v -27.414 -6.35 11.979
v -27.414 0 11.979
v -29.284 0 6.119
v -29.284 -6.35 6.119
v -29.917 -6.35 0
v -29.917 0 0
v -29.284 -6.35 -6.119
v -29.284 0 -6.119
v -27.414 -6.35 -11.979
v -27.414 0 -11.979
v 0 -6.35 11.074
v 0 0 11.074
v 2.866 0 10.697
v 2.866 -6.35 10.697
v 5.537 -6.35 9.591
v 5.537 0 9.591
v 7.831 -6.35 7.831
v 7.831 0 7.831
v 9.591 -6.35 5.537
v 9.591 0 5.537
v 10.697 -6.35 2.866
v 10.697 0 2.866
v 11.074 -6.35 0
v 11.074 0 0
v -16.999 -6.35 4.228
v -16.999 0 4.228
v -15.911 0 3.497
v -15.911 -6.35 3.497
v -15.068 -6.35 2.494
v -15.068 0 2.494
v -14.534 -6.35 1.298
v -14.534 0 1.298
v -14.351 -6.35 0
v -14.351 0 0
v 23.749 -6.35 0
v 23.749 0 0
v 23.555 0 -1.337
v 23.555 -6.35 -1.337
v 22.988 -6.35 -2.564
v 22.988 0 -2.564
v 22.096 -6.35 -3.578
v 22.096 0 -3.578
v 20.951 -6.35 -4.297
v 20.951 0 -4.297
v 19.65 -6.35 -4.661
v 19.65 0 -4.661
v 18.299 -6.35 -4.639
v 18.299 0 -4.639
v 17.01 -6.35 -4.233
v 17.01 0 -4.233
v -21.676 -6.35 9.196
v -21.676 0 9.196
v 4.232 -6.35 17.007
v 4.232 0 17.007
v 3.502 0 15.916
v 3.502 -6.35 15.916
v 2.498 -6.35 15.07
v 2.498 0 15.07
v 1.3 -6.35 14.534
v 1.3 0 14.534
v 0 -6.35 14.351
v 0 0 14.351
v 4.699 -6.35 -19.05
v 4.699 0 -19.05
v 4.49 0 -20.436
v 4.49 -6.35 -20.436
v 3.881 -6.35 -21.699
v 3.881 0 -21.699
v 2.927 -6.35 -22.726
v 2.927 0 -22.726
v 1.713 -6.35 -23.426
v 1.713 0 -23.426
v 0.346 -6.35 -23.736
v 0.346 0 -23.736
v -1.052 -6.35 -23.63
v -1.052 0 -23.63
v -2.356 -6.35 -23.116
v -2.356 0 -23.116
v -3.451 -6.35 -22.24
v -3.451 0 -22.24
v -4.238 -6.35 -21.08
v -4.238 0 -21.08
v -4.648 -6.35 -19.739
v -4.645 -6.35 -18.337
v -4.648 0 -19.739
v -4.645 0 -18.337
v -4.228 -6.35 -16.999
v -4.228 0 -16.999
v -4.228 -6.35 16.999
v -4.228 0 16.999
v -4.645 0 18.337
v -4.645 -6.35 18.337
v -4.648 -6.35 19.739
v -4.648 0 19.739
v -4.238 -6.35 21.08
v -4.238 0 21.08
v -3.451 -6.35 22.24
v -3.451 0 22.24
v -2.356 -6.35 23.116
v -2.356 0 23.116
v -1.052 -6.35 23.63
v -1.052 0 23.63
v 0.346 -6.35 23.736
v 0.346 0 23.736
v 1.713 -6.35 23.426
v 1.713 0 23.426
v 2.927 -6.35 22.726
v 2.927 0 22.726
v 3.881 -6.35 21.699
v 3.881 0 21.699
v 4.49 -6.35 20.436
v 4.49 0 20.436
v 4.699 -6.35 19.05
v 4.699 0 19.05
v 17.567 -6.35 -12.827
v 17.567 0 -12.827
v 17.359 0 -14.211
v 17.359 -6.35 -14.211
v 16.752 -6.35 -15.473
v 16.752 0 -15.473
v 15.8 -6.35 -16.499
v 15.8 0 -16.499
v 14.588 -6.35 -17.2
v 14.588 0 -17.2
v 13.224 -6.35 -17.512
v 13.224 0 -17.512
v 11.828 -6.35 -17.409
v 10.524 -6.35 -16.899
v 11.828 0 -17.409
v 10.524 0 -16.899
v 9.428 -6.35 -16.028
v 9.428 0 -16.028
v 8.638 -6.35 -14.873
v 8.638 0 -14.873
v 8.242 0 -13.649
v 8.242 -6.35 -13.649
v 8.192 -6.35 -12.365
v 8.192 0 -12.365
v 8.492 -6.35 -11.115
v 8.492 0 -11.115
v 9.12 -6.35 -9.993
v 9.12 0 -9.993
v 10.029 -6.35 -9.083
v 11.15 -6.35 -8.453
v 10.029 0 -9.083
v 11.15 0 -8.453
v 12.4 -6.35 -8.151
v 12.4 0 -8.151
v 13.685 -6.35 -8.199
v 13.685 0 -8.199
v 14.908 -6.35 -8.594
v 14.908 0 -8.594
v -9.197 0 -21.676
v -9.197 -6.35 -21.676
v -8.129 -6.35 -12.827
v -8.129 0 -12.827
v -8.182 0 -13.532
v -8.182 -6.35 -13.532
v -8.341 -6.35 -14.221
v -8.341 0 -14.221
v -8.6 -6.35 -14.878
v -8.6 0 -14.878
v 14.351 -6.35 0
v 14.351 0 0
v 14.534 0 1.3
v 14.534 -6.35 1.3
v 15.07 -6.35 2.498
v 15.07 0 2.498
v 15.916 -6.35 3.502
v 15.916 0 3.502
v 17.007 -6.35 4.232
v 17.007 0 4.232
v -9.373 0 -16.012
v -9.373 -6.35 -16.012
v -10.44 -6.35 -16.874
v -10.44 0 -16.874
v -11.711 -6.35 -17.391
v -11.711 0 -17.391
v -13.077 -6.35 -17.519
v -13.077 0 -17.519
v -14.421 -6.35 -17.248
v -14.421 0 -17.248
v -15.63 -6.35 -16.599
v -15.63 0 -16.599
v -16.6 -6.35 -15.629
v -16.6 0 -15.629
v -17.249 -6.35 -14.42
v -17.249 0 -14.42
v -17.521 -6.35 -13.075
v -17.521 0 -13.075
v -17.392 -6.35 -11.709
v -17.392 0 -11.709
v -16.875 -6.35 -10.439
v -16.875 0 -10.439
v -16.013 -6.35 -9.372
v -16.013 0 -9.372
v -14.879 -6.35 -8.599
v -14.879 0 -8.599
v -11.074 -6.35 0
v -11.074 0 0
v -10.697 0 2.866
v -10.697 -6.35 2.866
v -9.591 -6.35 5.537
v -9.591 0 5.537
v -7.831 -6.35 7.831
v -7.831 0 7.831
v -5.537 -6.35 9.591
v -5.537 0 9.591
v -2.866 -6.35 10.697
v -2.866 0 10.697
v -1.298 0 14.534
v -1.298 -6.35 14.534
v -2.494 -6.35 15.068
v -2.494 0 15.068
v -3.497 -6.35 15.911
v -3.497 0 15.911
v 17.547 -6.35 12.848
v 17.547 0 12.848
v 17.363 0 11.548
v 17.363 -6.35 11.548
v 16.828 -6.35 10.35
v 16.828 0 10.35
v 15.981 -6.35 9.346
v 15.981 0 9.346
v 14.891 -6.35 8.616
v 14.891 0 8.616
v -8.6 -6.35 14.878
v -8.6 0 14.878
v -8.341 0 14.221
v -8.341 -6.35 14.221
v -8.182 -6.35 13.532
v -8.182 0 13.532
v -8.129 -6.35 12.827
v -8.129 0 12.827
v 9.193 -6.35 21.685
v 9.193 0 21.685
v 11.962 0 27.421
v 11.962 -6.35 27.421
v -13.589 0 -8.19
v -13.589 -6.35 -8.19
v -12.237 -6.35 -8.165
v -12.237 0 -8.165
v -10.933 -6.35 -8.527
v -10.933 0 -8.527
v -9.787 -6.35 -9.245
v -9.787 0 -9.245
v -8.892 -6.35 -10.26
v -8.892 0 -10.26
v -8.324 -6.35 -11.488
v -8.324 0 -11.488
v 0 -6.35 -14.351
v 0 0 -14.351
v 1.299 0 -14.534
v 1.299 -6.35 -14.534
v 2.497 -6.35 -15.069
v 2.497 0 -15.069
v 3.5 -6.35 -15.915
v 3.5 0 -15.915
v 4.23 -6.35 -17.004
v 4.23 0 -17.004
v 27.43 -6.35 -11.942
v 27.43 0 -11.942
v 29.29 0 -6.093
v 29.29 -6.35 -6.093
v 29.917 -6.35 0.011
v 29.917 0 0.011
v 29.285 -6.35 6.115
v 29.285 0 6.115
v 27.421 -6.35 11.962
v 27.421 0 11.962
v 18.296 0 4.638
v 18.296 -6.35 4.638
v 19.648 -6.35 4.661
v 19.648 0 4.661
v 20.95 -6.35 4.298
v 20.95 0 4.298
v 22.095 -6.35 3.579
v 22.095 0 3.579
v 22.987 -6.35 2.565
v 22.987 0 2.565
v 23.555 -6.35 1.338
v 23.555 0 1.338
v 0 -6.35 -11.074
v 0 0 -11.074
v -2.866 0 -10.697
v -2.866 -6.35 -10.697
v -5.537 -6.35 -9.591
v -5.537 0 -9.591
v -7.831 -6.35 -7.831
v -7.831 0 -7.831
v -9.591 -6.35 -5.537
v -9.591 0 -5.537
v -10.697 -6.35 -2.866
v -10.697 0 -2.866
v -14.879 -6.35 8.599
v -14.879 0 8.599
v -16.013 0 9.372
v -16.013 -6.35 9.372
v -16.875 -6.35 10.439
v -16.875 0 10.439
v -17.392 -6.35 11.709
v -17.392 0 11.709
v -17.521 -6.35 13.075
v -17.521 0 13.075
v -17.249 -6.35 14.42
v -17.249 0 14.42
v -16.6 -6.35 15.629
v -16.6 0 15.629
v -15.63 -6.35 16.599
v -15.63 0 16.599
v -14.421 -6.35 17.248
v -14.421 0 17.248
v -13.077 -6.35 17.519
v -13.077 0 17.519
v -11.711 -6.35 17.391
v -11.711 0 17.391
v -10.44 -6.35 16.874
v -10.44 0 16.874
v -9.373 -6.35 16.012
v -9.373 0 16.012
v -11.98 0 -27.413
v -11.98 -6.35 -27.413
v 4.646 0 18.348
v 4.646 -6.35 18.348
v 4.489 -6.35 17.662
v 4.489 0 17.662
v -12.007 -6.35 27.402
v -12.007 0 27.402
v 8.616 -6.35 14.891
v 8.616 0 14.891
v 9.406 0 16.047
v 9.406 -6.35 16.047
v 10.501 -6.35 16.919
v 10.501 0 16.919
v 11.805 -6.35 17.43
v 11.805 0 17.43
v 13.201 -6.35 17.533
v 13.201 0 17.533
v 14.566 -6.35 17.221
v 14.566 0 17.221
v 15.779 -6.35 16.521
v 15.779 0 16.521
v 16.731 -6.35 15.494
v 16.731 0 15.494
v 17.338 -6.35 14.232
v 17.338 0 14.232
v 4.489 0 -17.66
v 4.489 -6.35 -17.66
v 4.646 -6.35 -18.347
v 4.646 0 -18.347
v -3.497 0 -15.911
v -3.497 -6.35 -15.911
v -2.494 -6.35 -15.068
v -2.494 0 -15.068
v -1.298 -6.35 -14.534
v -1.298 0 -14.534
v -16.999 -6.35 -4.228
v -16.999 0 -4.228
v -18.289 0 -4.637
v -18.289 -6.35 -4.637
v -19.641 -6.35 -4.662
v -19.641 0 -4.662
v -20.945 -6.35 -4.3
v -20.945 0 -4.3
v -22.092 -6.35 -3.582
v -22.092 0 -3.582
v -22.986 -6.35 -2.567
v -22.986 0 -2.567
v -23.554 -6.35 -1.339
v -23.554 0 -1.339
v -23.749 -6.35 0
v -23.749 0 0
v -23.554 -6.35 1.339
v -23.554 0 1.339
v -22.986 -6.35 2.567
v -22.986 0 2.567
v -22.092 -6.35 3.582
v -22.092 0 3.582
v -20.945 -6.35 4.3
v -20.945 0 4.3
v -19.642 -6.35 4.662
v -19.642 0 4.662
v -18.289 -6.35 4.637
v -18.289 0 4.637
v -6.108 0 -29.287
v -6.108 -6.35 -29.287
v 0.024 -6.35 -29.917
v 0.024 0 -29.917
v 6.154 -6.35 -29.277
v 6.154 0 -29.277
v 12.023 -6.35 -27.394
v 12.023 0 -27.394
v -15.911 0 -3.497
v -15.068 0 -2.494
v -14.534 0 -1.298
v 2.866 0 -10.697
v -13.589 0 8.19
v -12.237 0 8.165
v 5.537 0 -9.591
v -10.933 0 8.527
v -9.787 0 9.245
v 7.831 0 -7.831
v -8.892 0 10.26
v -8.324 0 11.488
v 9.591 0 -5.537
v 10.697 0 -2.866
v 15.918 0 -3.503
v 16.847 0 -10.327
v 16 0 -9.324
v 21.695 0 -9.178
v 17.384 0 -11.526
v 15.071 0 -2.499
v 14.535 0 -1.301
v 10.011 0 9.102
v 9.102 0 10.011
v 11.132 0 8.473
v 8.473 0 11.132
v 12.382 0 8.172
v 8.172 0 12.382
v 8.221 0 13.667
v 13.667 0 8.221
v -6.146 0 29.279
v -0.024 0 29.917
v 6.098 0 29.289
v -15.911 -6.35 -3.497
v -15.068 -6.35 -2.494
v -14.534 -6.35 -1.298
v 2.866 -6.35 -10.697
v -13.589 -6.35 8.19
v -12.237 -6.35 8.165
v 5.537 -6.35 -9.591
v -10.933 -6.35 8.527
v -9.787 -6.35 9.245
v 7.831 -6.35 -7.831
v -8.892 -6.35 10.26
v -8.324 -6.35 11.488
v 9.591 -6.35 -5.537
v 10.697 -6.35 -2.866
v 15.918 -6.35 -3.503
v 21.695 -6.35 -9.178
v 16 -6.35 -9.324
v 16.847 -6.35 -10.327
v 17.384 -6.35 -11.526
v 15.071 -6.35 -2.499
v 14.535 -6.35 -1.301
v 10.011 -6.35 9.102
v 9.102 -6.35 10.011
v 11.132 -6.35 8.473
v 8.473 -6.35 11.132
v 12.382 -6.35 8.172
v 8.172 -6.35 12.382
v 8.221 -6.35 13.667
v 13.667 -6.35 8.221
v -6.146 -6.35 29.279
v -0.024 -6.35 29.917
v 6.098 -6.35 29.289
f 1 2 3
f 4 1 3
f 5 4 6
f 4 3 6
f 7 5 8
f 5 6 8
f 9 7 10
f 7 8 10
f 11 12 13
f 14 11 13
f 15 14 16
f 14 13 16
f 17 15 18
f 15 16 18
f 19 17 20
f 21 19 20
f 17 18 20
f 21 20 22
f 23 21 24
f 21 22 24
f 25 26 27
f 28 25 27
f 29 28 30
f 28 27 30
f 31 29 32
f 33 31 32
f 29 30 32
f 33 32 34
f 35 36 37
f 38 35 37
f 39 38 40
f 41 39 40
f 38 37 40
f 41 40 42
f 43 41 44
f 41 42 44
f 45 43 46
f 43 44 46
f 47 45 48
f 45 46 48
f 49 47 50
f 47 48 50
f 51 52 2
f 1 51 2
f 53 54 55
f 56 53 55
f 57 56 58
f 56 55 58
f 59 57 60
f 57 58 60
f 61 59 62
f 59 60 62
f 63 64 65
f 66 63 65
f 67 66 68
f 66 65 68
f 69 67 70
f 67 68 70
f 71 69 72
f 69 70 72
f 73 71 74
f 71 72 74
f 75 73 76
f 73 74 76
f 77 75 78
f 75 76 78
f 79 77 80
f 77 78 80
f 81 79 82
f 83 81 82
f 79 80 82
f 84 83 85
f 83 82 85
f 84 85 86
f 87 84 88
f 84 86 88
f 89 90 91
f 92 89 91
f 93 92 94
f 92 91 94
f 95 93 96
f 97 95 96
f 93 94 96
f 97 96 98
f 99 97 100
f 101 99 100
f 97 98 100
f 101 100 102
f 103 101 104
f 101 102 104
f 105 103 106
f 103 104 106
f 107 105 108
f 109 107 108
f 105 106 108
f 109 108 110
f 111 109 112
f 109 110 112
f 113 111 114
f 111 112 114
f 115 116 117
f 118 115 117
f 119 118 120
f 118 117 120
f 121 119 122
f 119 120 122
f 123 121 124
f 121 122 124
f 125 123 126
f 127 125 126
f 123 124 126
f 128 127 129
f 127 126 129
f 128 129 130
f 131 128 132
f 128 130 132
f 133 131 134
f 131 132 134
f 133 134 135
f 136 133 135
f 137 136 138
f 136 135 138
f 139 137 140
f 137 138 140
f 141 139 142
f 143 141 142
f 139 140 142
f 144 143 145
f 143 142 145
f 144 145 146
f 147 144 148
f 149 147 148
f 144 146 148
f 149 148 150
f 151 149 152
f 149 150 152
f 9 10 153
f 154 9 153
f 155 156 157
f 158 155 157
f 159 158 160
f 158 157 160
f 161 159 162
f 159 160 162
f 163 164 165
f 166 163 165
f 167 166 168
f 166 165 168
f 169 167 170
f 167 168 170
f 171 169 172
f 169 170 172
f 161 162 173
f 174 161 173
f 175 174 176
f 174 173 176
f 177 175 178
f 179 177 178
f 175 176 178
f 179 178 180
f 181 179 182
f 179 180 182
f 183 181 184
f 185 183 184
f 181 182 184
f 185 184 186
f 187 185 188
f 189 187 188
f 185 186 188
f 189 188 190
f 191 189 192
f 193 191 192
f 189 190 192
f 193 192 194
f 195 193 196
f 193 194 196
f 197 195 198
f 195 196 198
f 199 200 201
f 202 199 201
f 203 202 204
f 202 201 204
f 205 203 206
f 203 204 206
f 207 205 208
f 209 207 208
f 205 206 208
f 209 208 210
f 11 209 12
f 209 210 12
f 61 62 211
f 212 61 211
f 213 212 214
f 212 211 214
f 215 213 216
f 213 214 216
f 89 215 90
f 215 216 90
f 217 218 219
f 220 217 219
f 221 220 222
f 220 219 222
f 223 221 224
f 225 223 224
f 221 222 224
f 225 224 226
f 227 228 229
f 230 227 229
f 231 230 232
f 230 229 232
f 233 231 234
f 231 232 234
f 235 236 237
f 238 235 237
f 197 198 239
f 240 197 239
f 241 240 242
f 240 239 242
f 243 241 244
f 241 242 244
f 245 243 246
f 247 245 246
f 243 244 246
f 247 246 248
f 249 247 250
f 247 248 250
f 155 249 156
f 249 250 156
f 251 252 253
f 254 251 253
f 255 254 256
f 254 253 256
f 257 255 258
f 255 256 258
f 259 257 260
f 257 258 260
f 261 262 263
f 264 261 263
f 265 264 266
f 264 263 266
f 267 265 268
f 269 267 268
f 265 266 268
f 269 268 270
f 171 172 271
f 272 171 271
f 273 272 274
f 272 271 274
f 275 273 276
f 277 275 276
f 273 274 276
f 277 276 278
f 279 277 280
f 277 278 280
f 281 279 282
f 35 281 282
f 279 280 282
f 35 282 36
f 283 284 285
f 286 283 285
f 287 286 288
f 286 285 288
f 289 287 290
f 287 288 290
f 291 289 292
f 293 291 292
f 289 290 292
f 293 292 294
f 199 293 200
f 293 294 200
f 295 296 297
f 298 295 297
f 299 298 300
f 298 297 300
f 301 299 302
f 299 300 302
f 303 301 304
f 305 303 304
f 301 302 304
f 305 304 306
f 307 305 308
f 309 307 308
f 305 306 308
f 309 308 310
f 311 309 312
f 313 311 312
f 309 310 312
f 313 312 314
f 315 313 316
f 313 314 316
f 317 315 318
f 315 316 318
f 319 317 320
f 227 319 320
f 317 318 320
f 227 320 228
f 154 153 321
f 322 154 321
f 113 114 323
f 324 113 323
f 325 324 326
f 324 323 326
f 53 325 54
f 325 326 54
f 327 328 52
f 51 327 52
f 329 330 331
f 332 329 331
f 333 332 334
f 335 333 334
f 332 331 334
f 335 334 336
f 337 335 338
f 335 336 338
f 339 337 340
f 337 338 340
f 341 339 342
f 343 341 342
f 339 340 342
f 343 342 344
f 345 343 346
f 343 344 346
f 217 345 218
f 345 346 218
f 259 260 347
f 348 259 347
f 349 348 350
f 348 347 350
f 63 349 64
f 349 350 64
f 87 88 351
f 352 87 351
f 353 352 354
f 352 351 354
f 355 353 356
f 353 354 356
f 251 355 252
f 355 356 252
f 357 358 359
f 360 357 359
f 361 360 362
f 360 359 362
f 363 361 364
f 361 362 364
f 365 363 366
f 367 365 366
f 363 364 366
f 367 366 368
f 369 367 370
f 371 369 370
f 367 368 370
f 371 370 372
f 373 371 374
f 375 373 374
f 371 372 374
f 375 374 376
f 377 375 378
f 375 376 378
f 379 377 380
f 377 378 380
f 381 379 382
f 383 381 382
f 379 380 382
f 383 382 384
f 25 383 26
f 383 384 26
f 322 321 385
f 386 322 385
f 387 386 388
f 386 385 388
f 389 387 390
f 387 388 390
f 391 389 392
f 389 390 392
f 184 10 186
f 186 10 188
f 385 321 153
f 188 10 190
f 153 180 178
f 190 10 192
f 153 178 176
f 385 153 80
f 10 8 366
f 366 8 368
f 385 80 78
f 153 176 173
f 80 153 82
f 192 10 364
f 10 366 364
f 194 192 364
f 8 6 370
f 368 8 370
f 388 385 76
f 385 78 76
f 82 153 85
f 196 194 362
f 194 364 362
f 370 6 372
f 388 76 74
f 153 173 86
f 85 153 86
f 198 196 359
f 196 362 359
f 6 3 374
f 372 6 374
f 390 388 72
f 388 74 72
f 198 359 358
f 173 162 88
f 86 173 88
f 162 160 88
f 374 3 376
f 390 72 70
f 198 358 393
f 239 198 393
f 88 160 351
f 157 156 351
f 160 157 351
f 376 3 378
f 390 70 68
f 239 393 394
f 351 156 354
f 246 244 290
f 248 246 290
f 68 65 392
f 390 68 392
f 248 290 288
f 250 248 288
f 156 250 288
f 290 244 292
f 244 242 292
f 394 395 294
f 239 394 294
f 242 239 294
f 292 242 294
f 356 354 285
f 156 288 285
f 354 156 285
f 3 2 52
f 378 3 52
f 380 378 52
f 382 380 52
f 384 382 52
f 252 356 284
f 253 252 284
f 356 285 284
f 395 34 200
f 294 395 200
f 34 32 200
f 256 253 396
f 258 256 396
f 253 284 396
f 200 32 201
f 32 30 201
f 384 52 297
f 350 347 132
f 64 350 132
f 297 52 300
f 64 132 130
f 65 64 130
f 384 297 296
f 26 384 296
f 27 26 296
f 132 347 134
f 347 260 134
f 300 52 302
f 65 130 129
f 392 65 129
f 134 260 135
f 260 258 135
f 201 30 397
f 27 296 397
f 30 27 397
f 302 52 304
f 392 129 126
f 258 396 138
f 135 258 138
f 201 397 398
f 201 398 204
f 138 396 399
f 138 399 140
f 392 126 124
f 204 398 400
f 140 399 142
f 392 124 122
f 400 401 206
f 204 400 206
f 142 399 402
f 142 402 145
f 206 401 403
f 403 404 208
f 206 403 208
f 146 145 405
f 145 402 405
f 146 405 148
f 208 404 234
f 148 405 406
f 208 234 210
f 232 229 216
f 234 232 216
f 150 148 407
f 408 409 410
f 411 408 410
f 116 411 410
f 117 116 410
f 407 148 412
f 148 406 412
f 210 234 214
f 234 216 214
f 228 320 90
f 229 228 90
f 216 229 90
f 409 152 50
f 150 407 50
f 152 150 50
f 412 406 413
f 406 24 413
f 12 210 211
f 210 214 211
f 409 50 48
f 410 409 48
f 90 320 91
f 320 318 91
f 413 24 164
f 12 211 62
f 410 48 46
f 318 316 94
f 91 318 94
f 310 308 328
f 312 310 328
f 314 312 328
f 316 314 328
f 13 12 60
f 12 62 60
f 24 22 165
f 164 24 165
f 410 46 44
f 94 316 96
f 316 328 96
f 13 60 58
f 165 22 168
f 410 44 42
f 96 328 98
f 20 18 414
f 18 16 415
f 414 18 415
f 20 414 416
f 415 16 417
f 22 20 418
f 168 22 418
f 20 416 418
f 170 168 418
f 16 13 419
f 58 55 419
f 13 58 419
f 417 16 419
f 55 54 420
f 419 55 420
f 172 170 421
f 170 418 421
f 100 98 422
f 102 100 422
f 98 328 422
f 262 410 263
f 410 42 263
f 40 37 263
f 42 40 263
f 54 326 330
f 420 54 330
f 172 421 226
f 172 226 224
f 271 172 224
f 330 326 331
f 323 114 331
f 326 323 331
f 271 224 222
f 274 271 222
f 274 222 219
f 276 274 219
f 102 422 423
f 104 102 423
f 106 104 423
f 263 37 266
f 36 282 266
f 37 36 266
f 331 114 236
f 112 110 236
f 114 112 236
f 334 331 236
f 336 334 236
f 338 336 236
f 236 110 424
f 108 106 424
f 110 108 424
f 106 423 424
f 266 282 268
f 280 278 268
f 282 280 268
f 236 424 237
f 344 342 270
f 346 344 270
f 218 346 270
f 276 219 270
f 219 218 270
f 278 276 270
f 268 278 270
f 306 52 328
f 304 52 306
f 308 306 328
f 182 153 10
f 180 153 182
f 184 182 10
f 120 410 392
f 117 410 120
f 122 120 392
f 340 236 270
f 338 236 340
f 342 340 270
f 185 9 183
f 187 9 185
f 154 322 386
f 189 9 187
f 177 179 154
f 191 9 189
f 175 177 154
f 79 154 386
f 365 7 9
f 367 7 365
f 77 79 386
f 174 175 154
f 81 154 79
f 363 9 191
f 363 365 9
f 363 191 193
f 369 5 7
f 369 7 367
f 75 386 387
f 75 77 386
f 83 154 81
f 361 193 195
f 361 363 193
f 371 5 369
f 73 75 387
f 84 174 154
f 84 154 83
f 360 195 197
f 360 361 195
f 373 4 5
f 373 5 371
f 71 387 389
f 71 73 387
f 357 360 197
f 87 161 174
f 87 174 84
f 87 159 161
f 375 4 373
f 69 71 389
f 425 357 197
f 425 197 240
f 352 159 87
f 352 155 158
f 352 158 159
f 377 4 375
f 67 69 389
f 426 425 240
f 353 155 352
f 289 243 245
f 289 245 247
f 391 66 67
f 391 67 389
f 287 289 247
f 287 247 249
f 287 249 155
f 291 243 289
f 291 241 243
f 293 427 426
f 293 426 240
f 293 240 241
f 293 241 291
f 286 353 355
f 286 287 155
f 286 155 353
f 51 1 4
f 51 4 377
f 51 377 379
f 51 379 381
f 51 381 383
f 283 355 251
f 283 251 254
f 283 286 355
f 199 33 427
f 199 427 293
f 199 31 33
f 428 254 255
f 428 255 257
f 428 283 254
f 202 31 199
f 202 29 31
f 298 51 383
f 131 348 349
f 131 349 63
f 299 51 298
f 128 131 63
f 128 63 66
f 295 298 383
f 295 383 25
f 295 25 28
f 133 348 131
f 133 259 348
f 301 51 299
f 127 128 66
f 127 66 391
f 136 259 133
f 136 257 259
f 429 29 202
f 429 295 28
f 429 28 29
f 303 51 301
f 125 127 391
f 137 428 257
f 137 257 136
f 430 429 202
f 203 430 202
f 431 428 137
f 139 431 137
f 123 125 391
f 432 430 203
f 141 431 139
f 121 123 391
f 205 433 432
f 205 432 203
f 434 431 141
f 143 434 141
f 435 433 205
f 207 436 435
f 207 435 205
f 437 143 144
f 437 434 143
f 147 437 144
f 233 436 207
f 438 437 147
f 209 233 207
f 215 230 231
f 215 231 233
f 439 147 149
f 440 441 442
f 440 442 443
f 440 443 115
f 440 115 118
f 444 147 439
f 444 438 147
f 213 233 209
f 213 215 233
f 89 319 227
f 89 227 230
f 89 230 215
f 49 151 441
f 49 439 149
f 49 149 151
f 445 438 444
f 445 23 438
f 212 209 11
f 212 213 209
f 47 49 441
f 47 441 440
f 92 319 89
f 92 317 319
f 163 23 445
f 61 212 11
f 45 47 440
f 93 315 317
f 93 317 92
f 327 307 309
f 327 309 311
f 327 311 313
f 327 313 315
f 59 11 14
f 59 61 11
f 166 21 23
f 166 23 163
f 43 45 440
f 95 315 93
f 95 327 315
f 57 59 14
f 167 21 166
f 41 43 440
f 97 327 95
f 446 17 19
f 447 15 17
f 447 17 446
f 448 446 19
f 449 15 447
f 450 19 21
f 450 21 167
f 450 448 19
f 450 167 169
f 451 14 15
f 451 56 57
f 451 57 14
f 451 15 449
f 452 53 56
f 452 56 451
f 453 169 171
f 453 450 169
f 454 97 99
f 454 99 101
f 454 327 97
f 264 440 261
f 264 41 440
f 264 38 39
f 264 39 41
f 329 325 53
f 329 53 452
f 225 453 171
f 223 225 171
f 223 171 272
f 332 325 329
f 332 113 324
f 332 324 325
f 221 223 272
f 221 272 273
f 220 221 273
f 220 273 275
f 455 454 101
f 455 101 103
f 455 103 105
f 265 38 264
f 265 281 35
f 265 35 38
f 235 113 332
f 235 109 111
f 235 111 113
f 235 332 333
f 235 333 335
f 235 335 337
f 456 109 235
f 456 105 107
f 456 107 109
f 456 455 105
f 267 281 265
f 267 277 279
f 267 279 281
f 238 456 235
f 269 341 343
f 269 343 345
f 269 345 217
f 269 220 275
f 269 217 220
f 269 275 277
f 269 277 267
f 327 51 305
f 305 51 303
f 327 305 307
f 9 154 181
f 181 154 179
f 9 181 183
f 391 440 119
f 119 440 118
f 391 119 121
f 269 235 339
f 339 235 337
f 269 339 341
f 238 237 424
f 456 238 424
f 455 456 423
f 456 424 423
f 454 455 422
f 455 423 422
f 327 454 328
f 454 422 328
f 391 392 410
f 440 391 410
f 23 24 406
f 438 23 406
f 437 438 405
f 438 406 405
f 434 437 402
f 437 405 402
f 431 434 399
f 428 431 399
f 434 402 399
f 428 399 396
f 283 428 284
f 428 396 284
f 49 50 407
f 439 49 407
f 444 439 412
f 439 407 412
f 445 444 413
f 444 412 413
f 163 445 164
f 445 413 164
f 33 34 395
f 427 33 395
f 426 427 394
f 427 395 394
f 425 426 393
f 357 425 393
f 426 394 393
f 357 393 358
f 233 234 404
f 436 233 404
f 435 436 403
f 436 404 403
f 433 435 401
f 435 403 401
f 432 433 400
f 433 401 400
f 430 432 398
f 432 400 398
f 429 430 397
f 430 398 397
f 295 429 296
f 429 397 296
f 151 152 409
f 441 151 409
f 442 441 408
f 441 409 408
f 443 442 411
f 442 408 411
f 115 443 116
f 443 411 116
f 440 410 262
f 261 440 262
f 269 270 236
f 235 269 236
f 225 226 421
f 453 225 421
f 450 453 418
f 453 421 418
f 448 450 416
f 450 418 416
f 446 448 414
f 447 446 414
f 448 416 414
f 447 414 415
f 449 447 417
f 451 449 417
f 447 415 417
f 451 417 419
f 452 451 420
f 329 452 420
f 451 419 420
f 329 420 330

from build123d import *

# Parameters (mm, degrees)
F1_DEPTH = 6.35


with BuildPart() as f1:
    # F0 (on Front) → F1 (new body)
    with BuildSketch(Plane.XZ):
        with BuildLine():
            Line((-6.4141074981, 15.9385126175), (-4.2278079722, 16.9990878248))
            ThreePointArc((-4.2278079722, 16.9990878248), (-1.0521718821, 23.6296872525), (4.699, 19.05))
            ThreePointArc((4.699, 19.05), (4.5806844818, 18.0021781266), (4.2316960296, 17.0071221983))
            Line((4.2316960296, 17.0071221983), (6.4238473824, 15.9488473824))
            Line((6.4238473824, 15.9488473824), (9.1930085155, 21.6849947733))
            Line((9.1930085155, 21.6849947733), (11.9621696486, 27.4211421643))
            ThreePointArc((11.9621696486, 27.4211421643), (-0.0243040276, 29.9167503183), (-12.0067070775, 27.4016701215))
            Line((-12.0067070775, 27.4016701215), (-6.4141074981, 15.9385126175))
        make_face()
        with BuildLine():
            Line((-8.6004070241, 14.8779374102), (-6.4141074981, 15.9385126175))
            Line((-6.4141074981, 15.9385126175), (-12.0067070775, 27.4016701215))
            Line((-12.0067070775, 27.4016701215), (-21.6763890996, 9.1963973453))
            Line((-21.6763890996, 9.1963973453), (-15.9391074981, 6.4135126175))
            Line((-15.9391074981, 6.4135126175), (-14.8789637146, 8.5991379737))
            ThreePointArc((-14.8789637146, 8.5991379737), (-16.1509739914, 16.1496557682), (-8.6004070241, 14.8779374102))
        make_face()
        with BuildLine():
            ThreePointArc((-16.9992346746, -4.227879206), (-23.749, -9.2288e-06), (-16.9992512817, 4.2278872613))
            Line((-16.9992512817, 4.2278872613), (-15.9391074981, 6.4135126175))
            Line((-15.9391074981, 6.4135126175), (-21.6763890996, 9.1963973453))
            Line((-21.6763890996, 9.1963973453), (-27.4136707011, 11.9792820732))
            ThreePointArc((-27.4136707011, 11.9792820732), (-29.9167601905, 3.8177e-06), (-27.4136737585, -11.9792750765))
            Line((-27.4136737585, -11.9792750765), (-15.9391074981, -6.4134484614))
            Line((-15.9391074981, -6.4134484614), (-16.9992346746, -4.227879206))
        make_face()
        with BuildLine():
            Line((-9.1970720847, -21.6758947021), (-6.4141074981, -15.9384484614))
            Line((-6.4141074981, -15.9384484614), (-8.6004236303, -14.8778433301))
            ThreePointArc((-8.6004236303, -14.8778433301), (-16.1509809173, -16.1495205298), (-14.8789803216, -8.5990177168))
            Line((-14.8789803216, -8.5990177168), (-15.9391074981, -6.4134484614))
            Line((-15.9391074981, -6.4134484614), (-27.4136737585, -11.9792750765))
            Line((-27.4136737585, -11.9792750765), (-9.1970720847, -21.6758947021))
        make_face()
        with BuildLine():
            Line((6.4341816168, -15.9384484614), (4.2303024615, -17.0042380186))
            ThreePointArc((4.2303024615, -17.0042380186), (4.5803270771, -18.0006169113), (4.699, -19.05))
            ThreePointArc((4.699, -19.05), (-1.0521904227, -23.6296829928), (-4.227791366, -16.9990535926))
            Line((-4.227791366, -16.9990535926), (-6.4141074981, -15.9384484614))
            Line((-6.4141074981, -15.9384484614), (-9.1970720847, -21.6758947021))
            Line((-9.1970720847, -21.6758947021), (-11.9800366713, -27.4133409429))
            ThreePointArc((-11.9800366713, -27.4133409429), (0.0235983496, -29.9167508833), (12.0232690531, -27.3944071221))
            Line((12.0232690531, -27.3944071221), (6.4341816168, -15.9384484614))
        make_face()
        with BuildLine():
            Line((21.6946431052, -9.1775261509), (15.9591816168, -6.4134484614))
            Line((15.9591816168, -6.4134484614), (14.9083960431, -8.5938286342))
            ThreePointArc((14.9083960431, -8.5938286342), (16.8474784098, -10.3274483008), (17.5673632335, -12.8268969228))
            ThreePointArc((17.5673632335, -12.8268969228), (13.9177463222, -17.4072239999), (8.638060772, -14.8726589042))
            Line((8.638060772, -14.8726589042), (6.4341816168, -15.9384484614))
            Line((6.4341816168, -15.9384484614), (12.0232690531, -27.3944071221))
            Line((12.0232690531, -27.3944071221), (21.6946431052, -9.1775261509))
        make_face()
        with BuildLine():
            Line((15.9488473824, 6.4238473824), (17.0071221983, 4.2316960296))
            ThreePointArc((17.0071221983, 4.2316960296), (21.5481111074, 3.9799550117), (23.749, 0))
            ThreePointArc((23.749, 0), (21.549448622, -3.9791151763), (17.0099671904, -4.2330682886))
            Line((17.0099671904, -4.2330682886), (15.9591816168, -6.4134484614))
            Line((15.9591816168, -6.4134484614), (21.6946431052, -9.1775261509))
            Line((21.6946431052, -9.1775261509), (27.4301045936, -11.9416038403))
            ThreePointArc((27.4301045936, -11.9416038403), (29.9167580877, 0.0112169248), (27.4211421643, 11.9621696486))
            Line((27.4211421643, 11.9621696486), (15.9488473824, 6.4238473824))
        make_face()
        with BuildLine():
            Line((14.8905725665, 8.6159987352), (15.9488473824, 6.4238473824))
            Line((15.9488473824, 6.4238473824), (27.4211421643, 11.9621696486))
            Line((27.4211421643, 11.9621696486), (9.1930085155, 21.6849947733))
            Line((9.1930085155, 21.6849947733), (6.4238473824, 15.9488473824))
            Line((6.4238473824, 15.9488473824), (8.6159987352, 14.8905725665))
            ThreePointArc((8.6159987352, 14.8905725665), (13.8955166382, 17.4283792466), (17.5466947648, 12.8476947648))
            ThreePointArc((17.5466947648, 12.8476947648), (16.8276497765, 10.3495836574), (14.8905725665, 8.6159987352))
        make_face()
        with BuildLine():
            ThreePointArc((-11.0744, 0), (-7.8307833376, 7.8307833376), (0, 11.0744))
            Line((0, 11.0744), (0, 14.351))
            ThreePointArc((0, 14.351), (-2.4943300392, 15.0676742153), (-4.2278079722, 16.9990878248))
            Line((-4.2278079722, 16.9990878248), (-6.4141074981, 15.9385126175))
            Line((-6.4141074981, 15.9385126175), (-8.6004070241, 14.8779374102))
            ThreePointArc((-8.6004070241, 14.8779374102), (-8.2485277438, 13.879197117), (-8.1292149963, 12.827025235))
            ThreePointArc((-8.1292149963, 12.827025235), (-10.3338079753, 8.8447476689), (-14.8789637146, 8.5991379737))
            Line((-14.8789637146, 8.5991379737), (-15.9391074981, 6.4135126175))
            Line((-15.9391074981, 6.4135126175), (-16.9992512817, 4.2278872613))
            ThreePointArc((-16.9992512817, 4.2278872613), (-15.0677224339, 2.494407021), (-14.351, 0))
            Line((-14.351, 0), (-11.0744, 0))
        make_face()
        with BuildLine():
            Line((0, -14.351), (0, -11.0744))
            ThreePointArc((0, -11.0744), (-7.8307833376, -7.8307833376), (-11.0744, 0))
            Line((-11.0744, 0), (-14.351, 0))
            ThreePointArc((-14.351, 0), (-15.0677175349, -2.4943991998), (-16.9992346746, -4.227879206))
            Line((-16.9992346746, -4.227879206), (-15.9391074981, -6.4134484614))
            Line((-15.9391074981, -6.4134484614), (-14.8789803216, -8.5990177168))
            ThreePointArc((-14.8789803216, -8.5990177168), (-10.3338157965, -8.8446144577), (-8.1292149963, -12.8268969228))
            ThreePointArc((-8.1292149963, -12.8268969228), (-8.2485320035, -13.8790873455), (-8.6004236303, -14.8778433301))
            Line((-8.6004236303, -14.8778433301), (-6.4141074981, -15.9384484614))
            Line((-6.4141074981, -15.9384484614), (-4.227791366, -16.9990535926))
            ThreePointArc((-4.227791366, -16.9990535926), (-2.4943139169, -15.0676641171), (0, -14.351))
        make_face()
        with BuildLine():
            Line((14.351, 0), (11.0744, 0))
            ThreePointArc((11.0744, 0), (7.8307833376, -7.8307833376), (0, -11.0744))
            Line((0, -11.0744), (0, -14.351))
            ThreePointArc((0, -14.351), (2.4967544382, -15.0691937657), (4.2303024615, -17.0042380186))
            Line((4.2303024615, -17.0042380186), (6.4341816168, -15.9384484614))
            Line((6.4341816168, -15.9384484614), (8.638060772, -14.8726589042))
            ThreePointArc((8.638060772, -14.8726589042), (9.5434199744, -9.506452175), (14.9083960431, -8.5938286342))
            Line((14.9083960431, -8.5938286342), (15.9591816168, -6.4134484614))
            Line((15.9591816168, -6.4134484614), (17.0099671904, -4.2330682886))
            ThreePointArc((17.0099671904, -4.2330682886), (15.0708848237, -2.499448622), (14.351, 0))
        make_face()
        with BuildLine():
            ThreePointArc((0, 11.0744), (7.8307833376, 7.8307833376), (11.0744, 0))
            Line((11.0744, 0), (14.351, 0))
            ThreePointArc((14.351, 0), (15.0700449883, 2.4981111074), (17.0071221983, 4.2316960296))
            Line((17.0071221983, 4.2316960296), (15.9488473824, 6.4238473824))
            Line((15.9488473824, 6.4238473824), (14.8905725665, 8.6159987352))
            ThreePointArc((14.8905725665, 8.6159987352), (9.525, 9.525), (8.6159987352, 14.8905725665))
            Line((8.6159987352, 14.8905725665), (6.4238473824, 15.9488473824))
            Line((6.4238473824, 15.9488473824), (4.2316960296, 17.0071221983))
            ThreePointArc((4.2316960296, 17.0071221983), (2.4981111074, 15.0700449883), (0, 14.351))
            Line((0, 14.351), (0, 11.0744))
        make_face()
    extrude(amount=F1_DEPTH)


solid = f1.part
